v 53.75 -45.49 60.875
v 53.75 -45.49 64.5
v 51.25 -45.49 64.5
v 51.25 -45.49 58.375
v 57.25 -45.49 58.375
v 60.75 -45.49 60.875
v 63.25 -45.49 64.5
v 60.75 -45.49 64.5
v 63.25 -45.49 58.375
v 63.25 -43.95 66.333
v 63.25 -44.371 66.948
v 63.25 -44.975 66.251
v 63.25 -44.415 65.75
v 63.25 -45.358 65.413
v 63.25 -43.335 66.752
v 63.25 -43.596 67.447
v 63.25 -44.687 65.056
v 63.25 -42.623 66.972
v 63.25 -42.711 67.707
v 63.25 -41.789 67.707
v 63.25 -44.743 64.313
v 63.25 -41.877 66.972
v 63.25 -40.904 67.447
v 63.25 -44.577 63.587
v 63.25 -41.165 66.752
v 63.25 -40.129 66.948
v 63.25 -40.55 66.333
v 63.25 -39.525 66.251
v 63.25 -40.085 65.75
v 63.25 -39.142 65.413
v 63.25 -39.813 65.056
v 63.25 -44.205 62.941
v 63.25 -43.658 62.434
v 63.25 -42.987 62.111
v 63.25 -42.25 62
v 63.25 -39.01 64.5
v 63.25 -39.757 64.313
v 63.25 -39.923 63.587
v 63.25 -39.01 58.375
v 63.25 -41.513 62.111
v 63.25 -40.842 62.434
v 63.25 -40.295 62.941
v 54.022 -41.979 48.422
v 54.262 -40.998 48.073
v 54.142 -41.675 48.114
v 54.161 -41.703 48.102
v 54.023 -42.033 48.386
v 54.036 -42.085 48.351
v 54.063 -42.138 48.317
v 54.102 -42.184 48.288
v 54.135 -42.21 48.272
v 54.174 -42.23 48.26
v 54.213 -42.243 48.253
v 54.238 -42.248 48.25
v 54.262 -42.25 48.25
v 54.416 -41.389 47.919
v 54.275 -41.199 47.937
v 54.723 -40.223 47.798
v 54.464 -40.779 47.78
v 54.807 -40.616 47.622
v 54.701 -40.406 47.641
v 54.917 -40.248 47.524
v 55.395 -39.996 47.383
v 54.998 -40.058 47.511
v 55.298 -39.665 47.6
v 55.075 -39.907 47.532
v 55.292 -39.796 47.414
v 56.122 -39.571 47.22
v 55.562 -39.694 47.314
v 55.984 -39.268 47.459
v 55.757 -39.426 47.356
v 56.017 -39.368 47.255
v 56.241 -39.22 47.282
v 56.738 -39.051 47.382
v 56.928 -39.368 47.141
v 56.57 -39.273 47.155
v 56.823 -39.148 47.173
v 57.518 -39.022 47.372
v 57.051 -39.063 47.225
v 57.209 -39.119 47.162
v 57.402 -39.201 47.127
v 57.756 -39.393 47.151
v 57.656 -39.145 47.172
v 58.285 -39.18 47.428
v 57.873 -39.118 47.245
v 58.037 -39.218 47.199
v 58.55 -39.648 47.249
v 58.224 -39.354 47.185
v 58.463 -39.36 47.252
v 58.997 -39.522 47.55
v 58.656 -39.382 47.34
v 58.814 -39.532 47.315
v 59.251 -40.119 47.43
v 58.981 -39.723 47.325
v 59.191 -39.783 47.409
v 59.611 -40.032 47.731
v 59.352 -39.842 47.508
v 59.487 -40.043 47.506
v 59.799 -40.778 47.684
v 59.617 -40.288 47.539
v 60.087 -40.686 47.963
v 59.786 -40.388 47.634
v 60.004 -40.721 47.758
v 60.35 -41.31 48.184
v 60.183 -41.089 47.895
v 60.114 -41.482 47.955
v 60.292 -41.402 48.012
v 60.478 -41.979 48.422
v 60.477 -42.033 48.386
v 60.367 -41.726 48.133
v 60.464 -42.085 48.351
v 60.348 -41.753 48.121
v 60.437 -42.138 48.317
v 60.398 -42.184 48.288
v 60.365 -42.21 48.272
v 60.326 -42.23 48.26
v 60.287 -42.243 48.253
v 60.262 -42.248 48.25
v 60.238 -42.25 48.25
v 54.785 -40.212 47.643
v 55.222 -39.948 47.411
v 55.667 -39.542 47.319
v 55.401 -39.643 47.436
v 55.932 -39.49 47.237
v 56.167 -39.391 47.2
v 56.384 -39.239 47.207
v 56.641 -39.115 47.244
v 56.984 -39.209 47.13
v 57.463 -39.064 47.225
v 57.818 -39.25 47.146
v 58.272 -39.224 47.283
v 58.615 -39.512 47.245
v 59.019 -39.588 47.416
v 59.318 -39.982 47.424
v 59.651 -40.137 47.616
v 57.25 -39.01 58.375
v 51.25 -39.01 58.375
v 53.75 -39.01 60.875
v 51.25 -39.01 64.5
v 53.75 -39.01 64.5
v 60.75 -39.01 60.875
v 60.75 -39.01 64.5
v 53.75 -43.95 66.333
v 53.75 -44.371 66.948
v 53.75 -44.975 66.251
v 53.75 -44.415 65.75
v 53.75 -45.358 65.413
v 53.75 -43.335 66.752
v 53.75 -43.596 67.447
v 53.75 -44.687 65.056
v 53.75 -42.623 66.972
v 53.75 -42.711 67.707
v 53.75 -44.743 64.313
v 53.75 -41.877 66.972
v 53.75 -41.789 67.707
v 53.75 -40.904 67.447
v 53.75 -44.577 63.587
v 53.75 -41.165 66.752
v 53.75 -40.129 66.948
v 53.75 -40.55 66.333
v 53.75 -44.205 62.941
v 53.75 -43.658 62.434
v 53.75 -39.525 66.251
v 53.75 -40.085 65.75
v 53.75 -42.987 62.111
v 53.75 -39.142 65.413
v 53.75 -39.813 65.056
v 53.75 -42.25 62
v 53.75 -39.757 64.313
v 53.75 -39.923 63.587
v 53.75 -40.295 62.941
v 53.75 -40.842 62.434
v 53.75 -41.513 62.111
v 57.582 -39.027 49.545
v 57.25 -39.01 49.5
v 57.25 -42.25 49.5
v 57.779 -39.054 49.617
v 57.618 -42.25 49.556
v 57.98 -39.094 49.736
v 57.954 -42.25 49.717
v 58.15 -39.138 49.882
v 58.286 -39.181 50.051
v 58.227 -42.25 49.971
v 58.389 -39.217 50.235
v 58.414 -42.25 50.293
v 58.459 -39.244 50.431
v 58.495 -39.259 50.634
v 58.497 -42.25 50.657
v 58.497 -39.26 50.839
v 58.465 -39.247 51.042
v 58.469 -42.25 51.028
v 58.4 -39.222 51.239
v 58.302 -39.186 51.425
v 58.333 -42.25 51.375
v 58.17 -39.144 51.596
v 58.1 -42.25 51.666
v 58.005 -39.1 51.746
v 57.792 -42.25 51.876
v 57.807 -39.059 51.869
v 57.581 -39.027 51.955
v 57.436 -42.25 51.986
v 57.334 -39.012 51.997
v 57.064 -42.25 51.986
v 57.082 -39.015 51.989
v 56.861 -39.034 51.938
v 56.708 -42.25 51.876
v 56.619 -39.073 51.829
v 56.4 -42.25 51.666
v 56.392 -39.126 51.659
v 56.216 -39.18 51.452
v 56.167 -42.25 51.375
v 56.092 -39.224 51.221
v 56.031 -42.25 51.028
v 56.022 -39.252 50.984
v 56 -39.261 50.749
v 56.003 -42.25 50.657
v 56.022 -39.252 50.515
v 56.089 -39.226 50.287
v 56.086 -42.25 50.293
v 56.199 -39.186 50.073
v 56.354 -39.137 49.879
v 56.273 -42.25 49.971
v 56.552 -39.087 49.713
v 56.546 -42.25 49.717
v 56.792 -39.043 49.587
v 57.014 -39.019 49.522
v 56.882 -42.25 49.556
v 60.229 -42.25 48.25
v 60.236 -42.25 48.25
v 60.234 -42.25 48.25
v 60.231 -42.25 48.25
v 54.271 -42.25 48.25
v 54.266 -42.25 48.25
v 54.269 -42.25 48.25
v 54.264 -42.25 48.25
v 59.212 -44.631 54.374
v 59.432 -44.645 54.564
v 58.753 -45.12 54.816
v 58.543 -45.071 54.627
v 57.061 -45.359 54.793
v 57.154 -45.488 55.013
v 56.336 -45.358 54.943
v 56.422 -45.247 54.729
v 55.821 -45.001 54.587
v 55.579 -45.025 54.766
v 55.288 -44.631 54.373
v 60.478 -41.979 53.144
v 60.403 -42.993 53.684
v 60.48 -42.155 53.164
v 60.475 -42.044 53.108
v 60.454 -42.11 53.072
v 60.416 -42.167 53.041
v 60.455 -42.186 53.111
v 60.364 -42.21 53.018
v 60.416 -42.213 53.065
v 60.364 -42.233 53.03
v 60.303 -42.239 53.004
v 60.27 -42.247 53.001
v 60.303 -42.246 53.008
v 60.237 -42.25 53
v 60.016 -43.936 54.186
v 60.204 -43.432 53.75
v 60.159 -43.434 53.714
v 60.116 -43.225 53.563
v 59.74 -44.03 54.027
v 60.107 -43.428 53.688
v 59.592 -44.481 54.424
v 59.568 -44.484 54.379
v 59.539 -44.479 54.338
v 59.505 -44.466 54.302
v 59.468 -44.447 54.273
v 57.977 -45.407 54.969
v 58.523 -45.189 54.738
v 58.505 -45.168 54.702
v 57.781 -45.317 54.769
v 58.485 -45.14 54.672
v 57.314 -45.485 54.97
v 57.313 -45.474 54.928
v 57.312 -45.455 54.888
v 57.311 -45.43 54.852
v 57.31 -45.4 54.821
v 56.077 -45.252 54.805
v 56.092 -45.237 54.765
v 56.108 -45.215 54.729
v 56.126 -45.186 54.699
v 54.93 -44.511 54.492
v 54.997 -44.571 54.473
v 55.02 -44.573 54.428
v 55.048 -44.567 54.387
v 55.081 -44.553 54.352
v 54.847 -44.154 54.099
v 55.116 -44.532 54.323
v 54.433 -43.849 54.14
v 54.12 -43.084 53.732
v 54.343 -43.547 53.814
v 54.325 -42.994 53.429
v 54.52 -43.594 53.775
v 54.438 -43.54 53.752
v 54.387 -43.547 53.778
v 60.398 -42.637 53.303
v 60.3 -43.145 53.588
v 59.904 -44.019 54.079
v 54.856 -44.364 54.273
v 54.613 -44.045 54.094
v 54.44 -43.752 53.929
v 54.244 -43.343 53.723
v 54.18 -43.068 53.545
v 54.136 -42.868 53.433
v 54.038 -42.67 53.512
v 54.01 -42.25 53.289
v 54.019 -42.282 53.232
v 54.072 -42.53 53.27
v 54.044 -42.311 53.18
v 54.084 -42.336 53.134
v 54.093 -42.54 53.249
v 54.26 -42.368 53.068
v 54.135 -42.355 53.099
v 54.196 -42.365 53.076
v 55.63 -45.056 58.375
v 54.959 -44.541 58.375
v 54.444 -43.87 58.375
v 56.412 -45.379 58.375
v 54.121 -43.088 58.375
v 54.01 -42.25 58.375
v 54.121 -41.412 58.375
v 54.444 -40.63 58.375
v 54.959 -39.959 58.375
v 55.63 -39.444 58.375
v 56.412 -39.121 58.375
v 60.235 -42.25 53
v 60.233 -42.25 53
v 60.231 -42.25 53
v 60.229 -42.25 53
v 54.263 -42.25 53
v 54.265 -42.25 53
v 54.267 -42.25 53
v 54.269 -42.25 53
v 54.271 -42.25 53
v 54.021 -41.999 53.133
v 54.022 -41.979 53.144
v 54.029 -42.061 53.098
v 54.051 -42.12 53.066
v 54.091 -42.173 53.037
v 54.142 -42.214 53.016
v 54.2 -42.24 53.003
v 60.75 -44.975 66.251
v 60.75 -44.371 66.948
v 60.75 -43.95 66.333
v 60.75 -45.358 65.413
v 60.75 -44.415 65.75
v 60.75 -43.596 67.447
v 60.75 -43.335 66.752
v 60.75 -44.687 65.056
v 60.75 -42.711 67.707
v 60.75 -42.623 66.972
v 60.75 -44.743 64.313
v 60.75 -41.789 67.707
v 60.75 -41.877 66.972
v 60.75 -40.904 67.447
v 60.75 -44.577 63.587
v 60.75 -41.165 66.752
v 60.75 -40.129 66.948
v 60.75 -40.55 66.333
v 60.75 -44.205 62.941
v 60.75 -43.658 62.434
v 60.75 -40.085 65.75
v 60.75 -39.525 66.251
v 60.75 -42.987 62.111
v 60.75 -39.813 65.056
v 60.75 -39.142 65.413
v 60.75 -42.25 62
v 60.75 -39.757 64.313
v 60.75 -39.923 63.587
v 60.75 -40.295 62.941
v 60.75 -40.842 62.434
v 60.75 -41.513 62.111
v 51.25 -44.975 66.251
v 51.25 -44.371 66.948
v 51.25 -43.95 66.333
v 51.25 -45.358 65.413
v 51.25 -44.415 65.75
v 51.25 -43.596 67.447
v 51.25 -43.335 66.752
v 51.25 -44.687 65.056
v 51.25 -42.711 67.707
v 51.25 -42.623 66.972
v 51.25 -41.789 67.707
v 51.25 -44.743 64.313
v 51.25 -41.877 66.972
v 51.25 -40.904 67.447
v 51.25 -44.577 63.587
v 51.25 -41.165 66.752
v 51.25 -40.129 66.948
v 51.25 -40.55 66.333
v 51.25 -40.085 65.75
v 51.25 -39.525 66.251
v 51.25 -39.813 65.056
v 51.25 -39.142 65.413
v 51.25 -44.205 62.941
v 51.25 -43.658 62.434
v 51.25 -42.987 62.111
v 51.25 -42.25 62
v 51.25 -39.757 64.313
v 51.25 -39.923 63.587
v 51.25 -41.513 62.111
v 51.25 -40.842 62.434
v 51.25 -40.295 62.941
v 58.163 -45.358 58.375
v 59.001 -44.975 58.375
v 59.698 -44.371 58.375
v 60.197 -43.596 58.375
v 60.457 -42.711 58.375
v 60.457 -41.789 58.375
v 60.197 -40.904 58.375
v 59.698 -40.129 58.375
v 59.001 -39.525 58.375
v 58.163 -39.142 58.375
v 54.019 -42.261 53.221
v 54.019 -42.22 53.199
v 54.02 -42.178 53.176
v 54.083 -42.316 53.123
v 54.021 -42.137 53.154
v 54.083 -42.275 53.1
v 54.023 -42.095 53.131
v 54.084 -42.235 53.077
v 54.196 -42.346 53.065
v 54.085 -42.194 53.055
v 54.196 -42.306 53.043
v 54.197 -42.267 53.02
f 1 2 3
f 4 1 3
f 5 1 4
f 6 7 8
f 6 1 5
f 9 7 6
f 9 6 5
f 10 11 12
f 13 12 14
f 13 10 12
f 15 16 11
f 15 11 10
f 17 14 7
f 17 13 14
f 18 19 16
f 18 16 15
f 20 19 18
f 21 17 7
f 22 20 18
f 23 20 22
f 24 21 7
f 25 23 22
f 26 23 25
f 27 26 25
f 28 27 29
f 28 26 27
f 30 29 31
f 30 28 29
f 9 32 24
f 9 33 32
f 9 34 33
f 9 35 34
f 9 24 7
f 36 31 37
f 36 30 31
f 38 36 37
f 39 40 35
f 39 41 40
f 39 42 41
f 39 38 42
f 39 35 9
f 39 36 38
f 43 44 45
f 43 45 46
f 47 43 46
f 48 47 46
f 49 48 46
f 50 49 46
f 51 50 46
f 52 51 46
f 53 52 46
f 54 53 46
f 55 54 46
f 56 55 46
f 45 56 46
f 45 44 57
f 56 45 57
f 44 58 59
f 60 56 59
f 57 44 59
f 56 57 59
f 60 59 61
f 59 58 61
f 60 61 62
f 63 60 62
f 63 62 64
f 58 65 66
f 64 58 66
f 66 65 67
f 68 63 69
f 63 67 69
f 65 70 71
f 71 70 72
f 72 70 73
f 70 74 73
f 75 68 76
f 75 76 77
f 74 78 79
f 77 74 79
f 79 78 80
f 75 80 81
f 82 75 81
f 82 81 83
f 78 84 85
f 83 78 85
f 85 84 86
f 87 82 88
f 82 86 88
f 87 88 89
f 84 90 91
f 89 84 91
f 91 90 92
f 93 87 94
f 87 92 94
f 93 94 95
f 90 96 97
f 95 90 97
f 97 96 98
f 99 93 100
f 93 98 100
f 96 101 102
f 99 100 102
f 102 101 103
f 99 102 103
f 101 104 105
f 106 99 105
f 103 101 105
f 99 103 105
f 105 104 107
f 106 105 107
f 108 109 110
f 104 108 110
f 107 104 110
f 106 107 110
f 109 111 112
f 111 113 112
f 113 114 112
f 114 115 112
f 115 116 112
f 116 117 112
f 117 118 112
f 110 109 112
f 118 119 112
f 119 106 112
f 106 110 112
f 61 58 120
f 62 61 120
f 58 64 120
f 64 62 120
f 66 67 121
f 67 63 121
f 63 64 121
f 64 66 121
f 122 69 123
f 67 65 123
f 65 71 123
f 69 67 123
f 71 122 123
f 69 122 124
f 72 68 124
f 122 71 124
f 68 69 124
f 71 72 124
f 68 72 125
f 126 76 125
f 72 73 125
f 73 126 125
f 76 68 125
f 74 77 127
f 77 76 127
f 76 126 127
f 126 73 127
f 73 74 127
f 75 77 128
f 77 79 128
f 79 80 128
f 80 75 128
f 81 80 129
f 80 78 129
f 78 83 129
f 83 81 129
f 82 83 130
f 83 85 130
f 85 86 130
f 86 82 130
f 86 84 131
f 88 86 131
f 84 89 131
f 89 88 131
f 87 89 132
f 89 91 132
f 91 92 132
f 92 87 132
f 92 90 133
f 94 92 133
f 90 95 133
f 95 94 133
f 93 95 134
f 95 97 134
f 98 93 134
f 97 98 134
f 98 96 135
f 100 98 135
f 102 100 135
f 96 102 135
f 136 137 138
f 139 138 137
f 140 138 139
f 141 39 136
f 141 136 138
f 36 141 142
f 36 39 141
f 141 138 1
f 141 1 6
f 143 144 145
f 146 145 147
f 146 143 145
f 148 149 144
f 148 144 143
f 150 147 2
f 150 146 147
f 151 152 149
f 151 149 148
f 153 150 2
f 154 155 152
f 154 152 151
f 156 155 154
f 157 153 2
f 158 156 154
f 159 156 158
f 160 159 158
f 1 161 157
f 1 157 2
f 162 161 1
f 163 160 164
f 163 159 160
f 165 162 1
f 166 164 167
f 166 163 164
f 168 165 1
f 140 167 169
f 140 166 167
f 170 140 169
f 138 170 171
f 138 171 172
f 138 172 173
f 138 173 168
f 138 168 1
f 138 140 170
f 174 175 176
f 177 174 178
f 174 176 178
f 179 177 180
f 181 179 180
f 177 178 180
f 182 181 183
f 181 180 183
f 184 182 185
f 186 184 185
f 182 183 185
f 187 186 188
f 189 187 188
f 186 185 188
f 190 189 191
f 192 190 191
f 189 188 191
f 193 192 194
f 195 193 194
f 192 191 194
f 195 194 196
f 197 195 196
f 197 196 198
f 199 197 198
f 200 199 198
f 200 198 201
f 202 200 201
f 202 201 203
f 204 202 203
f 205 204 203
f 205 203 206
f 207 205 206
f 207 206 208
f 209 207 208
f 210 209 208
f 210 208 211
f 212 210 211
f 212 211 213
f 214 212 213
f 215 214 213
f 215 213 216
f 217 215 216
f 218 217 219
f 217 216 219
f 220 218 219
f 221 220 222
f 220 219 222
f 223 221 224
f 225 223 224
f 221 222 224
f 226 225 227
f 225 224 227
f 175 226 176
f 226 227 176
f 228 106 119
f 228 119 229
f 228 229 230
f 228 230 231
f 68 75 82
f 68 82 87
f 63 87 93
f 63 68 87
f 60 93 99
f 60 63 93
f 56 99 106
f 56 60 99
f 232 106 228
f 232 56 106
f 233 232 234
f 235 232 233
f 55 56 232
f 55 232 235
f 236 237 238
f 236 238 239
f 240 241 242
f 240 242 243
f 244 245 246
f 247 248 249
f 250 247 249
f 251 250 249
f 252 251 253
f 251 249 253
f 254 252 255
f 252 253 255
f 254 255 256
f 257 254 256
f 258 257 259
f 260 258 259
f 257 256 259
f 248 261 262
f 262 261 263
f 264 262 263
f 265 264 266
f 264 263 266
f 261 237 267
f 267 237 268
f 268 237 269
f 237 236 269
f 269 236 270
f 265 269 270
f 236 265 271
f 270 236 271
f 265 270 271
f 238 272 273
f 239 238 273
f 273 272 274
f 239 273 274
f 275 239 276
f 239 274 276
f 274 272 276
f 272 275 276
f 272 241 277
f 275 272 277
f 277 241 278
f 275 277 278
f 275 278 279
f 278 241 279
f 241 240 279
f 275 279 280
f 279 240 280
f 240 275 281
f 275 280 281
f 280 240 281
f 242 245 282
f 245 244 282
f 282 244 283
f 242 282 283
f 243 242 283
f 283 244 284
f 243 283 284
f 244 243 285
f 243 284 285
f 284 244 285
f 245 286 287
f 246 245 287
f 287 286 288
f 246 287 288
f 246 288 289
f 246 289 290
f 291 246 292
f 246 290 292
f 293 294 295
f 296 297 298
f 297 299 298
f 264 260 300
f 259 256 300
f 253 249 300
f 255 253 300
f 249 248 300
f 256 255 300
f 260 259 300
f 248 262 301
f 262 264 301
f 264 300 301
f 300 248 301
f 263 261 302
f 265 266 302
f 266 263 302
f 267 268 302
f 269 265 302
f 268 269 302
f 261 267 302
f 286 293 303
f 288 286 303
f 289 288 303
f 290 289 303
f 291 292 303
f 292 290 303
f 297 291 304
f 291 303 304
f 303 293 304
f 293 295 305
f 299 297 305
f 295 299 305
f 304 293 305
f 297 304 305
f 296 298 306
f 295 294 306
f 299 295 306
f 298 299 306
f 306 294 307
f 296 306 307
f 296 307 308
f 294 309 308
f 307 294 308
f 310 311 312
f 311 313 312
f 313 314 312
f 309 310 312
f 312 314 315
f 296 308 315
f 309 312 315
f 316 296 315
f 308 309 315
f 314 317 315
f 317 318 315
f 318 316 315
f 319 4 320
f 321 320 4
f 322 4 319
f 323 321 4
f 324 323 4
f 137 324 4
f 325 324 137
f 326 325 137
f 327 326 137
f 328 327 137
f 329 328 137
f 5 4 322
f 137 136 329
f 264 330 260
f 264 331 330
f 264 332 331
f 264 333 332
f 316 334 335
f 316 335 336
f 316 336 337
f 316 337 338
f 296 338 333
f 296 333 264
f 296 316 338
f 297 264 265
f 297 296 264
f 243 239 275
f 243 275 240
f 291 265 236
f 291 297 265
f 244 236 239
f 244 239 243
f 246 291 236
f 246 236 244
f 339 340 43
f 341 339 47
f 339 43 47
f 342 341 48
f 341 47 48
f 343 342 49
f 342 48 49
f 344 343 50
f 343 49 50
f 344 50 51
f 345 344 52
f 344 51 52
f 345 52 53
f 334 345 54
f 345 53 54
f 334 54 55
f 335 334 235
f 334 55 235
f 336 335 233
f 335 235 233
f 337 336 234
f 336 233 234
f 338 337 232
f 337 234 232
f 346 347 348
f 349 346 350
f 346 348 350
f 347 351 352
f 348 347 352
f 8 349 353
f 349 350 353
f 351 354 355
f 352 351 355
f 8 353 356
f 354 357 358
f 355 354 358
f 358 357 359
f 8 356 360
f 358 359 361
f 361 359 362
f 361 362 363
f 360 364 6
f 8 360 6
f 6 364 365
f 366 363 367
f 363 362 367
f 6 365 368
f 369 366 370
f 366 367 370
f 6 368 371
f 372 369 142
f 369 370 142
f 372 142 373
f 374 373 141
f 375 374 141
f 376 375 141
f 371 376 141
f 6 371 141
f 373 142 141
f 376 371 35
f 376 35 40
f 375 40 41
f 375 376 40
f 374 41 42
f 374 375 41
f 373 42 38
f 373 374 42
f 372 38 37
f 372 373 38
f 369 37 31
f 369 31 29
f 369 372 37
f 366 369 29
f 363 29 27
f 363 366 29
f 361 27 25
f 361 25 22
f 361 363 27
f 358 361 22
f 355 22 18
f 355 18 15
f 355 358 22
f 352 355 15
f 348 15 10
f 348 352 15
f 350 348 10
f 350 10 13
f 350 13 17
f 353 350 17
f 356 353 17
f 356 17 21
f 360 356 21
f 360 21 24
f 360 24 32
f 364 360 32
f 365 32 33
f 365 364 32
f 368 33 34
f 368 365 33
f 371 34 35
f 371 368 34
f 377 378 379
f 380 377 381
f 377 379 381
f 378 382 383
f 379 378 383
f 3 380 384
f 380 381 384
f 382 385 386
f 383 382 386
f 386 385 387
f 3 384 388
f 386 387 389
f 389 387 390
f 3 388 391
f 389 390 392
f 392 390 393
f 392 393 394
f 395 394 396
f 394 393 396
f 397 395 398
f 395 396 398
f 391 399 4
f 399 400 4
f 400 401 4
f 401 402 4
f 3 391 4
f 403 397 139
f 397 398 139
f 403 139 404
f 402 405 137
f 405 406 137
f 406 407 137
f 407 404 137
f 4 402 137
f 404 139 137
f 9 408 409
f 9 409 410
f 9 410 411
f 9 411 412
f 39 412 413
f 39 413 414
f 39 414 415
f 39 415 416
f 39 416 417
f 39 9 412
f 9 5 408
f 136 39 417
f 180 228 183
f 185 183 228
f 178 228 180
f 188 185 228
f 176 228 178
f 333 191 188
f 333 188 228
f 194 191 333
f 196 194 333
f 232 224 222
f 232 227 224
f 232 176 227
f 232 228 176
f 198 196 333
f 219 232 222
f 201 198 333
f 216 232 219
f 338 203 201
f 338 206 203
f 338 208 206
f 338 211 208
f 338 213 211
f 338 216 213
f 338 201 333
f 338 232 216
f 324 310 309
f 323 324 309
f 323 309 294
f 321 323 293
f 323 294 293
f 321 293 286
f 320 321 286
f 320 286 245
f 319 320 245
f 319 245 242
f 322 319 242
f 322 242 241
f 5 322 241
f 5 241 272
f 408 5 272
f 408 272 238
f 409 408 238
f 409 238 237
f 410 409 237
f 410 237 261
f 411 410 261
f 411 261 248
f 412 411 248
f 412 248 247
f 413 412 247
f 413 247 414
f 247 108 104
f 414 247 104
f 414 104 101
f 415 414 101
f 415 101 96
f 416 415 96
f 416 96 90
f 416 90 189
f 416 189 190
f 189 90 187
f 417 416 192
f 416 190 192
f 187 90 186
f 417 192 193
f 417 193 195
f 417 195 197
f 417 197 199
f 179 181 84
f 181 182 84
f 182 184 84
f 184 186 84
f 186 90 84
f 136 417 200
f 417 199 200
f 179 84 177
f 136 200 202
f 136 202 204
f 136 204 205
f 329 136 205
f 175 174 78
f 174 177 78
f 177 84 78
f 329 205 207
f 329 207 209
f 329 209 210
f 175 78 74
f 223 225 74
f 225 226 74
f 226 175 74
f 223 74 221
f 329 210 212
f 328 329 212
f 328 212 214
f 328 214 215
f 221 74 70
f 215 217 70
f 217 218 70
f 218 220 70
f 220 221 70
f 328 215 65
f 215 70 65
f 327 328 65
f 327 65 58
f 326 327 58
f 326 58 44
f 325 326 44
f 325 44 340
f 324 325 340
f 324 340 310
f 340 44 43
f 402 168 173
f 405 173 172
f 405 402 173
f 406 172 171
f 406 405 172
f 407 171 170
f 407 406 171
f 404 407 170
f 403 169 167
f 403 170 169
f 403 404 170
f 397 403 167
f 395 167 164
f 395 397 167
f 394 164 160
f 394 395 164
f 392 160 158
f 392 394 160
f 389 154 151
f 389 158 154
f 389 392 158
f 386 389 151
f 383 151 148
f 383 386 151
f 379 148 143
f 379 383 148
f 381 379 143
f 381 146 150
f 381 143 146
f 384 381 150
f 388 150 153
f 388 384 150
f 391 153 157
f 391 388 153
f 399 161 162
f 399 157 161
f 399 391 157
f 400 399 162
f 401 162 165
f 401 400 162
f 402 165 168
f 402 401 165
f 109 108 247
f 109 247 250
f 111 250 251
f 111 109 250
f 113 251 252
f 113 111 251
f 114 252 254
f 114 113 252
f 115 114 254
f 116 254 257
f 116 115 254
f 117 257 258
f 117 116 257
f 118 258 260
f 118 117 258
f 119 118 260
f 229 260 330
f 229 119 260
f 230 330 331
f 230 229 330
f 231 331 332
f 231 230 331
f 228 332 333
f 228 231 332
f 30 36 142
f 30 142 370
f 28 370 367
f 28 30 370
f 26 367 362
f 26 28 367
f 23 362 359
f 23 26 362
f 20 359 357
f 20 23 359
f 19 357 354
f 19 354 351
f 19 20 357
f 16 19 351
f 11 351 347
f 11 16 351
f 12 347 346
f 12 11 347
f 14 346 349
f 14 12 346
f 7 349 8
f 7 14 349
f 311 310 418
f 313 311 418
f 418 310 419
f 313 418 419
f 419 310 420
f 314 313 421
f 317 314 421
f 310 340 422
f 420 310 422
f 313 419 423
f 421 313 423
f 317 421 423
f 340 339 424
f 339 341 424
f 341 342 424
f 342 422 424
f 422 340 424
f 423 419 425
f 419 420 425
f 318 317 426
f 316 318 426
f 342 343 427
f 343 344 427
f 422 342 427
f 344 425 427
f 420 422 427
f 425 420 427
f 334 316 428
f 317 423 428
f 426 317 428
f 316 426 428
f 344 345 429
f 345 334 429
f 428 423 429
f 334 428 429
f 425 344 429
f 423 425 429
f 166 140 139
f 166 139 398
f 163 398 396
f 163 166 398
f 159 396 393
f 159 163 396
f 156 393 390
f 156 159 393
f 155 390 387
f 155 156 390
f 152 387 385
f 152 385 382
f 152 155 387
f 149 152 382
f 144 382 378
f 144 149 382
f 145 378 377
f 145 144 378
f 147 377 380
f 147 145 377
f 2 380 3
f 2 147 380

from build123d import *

# Parameters (mm, degrees)
CUT_EXTRUDE_1_DEPTH      = 96.582051988
CUT_EXTRUDE_1_DEPTH_BACK = 96.582051988
FILLET_1_R               = 0.25
SKETCH_4_R               = 1.25
CUT_EXTRUDE_2_DEPTH      = 85.125637832
SKETCH_5_R               = 2.5
EXTRUDE_1_DEPTH          = 6
SKETCH_6_W               = 7
SKETCH_6_H               = 13.635845178
CUT_EXTRUDE_3_DEPTH      = 104.240069036


with BuildPart() as part:
    # 草图1 → 旋转1 (revolve)
    with BuildSketch(Plane(origin=(0, -42.25, 0), x_dir=(1, 0, 0), z_dir=(0, 1, 0)), mode=Mode.PRIVATE) as revolve_1_sk:
        Polygon((57.25, -47), (57.25, -53), (57.25, -58.375), (60.489565186, -58.375), (60.489565186, -47), align=None)
    revolve(revolve_1_sk.sketch.rotate(Axis((57.25, -42.25, 47), (0, 0, 1)), 180), axis=Axis((57.25, -42.25, 47), (0, 0, 1)))

    # 草图2 → 切除-拉伸1 (cut, two sides: drawn at the far end of the back side and taken through both)
    with BuildSketch(Plane(origin=(0, 0, 0), x_dir=(0, 0, -1), z_dir=(1, 0, 0)).offset(-CUT_EXTRUDE_1_DEPTH_BACK)):
        Polygon((-48.25, -42.25), (-53, -42.25), (-54.875, -45.5), (-45.95593144, -45.5), (-45.95593144, -39), (-47, -39), align=None)
    extrude(amount=CUT_EXTRUDE_1_DEPTH + CUT_EXTRUDE_1_DEPTH_BACK, mode=Mode.SUBTRACT)

    # 圆角1
    fillet_1_edges = [part.edges().sort_by_distance(p)[0] for p in [
        (57.250000001, -39.010434814, 47.00401339),
        (54.010434814, -42.25, 50.625),
        (57.249999966, -45.489565186, 54.868979915),
        (60.489565186, -42.25, 50.625),
    ]]
    fillet(fillet_1_edges, radius=FILLET_1_R)

    # 草图4 → 切除-拉伸2 (cut, through all)
    with BuildSketch(Plane.XZ.offset(42.25)):
        with Locations(Location((57.25, 50.75, 0), (0, 0, 270))):
            Circle(SKETCH_4_R)
    extrude(amount=-CUT_EXTRUDE_2_DEPTH, mode=Mode.SUBTRACT)

    # 草图5 → 凸台-拉伸1 (add, symmetric)
    with BuildSketch(Plane(origin=(57.25, 0, 0), x_dir=(0, 0, -1), z_dir=(1, 0, 0))):
        with BuildLine():
            Line((-64.5, -45.489565186), (-58.375, -45.489565186))
            Line((-58.375, -45.489565186), (-58.375, -39.010434814))
            Line((-58.375, -39.010434814), (-64.5, -39.010434814))
            ThreePointArc((-64.5, -39.010434814), (-67.739565186, -42.25), (-64.5, -45.489565186))
        make_face()
        with Locations((-64.5, -42.25)):
            Circle(SKETCH_5_R, mode=Mode.SUBTRACT)
    extrude(amount=EXTRUDE_1_DEPTH, both=True)

    # 草图6 → 切除-拉伸3 (cut, through all)
    with BuildSketch(Plane(origin=(0, 0, 0), x_dir=(1, 0, 0), z_dir=(0, 1, 0))):
        with Locations((57.25, -67.692922589)):
            Rectangle(SKETCH_6_W, SKETCH_6_H)
    extrude(amount=-CUT_EXTRUDE_3_DEPTH, mode=Mode.SUBTRACT)


solid = part.part
